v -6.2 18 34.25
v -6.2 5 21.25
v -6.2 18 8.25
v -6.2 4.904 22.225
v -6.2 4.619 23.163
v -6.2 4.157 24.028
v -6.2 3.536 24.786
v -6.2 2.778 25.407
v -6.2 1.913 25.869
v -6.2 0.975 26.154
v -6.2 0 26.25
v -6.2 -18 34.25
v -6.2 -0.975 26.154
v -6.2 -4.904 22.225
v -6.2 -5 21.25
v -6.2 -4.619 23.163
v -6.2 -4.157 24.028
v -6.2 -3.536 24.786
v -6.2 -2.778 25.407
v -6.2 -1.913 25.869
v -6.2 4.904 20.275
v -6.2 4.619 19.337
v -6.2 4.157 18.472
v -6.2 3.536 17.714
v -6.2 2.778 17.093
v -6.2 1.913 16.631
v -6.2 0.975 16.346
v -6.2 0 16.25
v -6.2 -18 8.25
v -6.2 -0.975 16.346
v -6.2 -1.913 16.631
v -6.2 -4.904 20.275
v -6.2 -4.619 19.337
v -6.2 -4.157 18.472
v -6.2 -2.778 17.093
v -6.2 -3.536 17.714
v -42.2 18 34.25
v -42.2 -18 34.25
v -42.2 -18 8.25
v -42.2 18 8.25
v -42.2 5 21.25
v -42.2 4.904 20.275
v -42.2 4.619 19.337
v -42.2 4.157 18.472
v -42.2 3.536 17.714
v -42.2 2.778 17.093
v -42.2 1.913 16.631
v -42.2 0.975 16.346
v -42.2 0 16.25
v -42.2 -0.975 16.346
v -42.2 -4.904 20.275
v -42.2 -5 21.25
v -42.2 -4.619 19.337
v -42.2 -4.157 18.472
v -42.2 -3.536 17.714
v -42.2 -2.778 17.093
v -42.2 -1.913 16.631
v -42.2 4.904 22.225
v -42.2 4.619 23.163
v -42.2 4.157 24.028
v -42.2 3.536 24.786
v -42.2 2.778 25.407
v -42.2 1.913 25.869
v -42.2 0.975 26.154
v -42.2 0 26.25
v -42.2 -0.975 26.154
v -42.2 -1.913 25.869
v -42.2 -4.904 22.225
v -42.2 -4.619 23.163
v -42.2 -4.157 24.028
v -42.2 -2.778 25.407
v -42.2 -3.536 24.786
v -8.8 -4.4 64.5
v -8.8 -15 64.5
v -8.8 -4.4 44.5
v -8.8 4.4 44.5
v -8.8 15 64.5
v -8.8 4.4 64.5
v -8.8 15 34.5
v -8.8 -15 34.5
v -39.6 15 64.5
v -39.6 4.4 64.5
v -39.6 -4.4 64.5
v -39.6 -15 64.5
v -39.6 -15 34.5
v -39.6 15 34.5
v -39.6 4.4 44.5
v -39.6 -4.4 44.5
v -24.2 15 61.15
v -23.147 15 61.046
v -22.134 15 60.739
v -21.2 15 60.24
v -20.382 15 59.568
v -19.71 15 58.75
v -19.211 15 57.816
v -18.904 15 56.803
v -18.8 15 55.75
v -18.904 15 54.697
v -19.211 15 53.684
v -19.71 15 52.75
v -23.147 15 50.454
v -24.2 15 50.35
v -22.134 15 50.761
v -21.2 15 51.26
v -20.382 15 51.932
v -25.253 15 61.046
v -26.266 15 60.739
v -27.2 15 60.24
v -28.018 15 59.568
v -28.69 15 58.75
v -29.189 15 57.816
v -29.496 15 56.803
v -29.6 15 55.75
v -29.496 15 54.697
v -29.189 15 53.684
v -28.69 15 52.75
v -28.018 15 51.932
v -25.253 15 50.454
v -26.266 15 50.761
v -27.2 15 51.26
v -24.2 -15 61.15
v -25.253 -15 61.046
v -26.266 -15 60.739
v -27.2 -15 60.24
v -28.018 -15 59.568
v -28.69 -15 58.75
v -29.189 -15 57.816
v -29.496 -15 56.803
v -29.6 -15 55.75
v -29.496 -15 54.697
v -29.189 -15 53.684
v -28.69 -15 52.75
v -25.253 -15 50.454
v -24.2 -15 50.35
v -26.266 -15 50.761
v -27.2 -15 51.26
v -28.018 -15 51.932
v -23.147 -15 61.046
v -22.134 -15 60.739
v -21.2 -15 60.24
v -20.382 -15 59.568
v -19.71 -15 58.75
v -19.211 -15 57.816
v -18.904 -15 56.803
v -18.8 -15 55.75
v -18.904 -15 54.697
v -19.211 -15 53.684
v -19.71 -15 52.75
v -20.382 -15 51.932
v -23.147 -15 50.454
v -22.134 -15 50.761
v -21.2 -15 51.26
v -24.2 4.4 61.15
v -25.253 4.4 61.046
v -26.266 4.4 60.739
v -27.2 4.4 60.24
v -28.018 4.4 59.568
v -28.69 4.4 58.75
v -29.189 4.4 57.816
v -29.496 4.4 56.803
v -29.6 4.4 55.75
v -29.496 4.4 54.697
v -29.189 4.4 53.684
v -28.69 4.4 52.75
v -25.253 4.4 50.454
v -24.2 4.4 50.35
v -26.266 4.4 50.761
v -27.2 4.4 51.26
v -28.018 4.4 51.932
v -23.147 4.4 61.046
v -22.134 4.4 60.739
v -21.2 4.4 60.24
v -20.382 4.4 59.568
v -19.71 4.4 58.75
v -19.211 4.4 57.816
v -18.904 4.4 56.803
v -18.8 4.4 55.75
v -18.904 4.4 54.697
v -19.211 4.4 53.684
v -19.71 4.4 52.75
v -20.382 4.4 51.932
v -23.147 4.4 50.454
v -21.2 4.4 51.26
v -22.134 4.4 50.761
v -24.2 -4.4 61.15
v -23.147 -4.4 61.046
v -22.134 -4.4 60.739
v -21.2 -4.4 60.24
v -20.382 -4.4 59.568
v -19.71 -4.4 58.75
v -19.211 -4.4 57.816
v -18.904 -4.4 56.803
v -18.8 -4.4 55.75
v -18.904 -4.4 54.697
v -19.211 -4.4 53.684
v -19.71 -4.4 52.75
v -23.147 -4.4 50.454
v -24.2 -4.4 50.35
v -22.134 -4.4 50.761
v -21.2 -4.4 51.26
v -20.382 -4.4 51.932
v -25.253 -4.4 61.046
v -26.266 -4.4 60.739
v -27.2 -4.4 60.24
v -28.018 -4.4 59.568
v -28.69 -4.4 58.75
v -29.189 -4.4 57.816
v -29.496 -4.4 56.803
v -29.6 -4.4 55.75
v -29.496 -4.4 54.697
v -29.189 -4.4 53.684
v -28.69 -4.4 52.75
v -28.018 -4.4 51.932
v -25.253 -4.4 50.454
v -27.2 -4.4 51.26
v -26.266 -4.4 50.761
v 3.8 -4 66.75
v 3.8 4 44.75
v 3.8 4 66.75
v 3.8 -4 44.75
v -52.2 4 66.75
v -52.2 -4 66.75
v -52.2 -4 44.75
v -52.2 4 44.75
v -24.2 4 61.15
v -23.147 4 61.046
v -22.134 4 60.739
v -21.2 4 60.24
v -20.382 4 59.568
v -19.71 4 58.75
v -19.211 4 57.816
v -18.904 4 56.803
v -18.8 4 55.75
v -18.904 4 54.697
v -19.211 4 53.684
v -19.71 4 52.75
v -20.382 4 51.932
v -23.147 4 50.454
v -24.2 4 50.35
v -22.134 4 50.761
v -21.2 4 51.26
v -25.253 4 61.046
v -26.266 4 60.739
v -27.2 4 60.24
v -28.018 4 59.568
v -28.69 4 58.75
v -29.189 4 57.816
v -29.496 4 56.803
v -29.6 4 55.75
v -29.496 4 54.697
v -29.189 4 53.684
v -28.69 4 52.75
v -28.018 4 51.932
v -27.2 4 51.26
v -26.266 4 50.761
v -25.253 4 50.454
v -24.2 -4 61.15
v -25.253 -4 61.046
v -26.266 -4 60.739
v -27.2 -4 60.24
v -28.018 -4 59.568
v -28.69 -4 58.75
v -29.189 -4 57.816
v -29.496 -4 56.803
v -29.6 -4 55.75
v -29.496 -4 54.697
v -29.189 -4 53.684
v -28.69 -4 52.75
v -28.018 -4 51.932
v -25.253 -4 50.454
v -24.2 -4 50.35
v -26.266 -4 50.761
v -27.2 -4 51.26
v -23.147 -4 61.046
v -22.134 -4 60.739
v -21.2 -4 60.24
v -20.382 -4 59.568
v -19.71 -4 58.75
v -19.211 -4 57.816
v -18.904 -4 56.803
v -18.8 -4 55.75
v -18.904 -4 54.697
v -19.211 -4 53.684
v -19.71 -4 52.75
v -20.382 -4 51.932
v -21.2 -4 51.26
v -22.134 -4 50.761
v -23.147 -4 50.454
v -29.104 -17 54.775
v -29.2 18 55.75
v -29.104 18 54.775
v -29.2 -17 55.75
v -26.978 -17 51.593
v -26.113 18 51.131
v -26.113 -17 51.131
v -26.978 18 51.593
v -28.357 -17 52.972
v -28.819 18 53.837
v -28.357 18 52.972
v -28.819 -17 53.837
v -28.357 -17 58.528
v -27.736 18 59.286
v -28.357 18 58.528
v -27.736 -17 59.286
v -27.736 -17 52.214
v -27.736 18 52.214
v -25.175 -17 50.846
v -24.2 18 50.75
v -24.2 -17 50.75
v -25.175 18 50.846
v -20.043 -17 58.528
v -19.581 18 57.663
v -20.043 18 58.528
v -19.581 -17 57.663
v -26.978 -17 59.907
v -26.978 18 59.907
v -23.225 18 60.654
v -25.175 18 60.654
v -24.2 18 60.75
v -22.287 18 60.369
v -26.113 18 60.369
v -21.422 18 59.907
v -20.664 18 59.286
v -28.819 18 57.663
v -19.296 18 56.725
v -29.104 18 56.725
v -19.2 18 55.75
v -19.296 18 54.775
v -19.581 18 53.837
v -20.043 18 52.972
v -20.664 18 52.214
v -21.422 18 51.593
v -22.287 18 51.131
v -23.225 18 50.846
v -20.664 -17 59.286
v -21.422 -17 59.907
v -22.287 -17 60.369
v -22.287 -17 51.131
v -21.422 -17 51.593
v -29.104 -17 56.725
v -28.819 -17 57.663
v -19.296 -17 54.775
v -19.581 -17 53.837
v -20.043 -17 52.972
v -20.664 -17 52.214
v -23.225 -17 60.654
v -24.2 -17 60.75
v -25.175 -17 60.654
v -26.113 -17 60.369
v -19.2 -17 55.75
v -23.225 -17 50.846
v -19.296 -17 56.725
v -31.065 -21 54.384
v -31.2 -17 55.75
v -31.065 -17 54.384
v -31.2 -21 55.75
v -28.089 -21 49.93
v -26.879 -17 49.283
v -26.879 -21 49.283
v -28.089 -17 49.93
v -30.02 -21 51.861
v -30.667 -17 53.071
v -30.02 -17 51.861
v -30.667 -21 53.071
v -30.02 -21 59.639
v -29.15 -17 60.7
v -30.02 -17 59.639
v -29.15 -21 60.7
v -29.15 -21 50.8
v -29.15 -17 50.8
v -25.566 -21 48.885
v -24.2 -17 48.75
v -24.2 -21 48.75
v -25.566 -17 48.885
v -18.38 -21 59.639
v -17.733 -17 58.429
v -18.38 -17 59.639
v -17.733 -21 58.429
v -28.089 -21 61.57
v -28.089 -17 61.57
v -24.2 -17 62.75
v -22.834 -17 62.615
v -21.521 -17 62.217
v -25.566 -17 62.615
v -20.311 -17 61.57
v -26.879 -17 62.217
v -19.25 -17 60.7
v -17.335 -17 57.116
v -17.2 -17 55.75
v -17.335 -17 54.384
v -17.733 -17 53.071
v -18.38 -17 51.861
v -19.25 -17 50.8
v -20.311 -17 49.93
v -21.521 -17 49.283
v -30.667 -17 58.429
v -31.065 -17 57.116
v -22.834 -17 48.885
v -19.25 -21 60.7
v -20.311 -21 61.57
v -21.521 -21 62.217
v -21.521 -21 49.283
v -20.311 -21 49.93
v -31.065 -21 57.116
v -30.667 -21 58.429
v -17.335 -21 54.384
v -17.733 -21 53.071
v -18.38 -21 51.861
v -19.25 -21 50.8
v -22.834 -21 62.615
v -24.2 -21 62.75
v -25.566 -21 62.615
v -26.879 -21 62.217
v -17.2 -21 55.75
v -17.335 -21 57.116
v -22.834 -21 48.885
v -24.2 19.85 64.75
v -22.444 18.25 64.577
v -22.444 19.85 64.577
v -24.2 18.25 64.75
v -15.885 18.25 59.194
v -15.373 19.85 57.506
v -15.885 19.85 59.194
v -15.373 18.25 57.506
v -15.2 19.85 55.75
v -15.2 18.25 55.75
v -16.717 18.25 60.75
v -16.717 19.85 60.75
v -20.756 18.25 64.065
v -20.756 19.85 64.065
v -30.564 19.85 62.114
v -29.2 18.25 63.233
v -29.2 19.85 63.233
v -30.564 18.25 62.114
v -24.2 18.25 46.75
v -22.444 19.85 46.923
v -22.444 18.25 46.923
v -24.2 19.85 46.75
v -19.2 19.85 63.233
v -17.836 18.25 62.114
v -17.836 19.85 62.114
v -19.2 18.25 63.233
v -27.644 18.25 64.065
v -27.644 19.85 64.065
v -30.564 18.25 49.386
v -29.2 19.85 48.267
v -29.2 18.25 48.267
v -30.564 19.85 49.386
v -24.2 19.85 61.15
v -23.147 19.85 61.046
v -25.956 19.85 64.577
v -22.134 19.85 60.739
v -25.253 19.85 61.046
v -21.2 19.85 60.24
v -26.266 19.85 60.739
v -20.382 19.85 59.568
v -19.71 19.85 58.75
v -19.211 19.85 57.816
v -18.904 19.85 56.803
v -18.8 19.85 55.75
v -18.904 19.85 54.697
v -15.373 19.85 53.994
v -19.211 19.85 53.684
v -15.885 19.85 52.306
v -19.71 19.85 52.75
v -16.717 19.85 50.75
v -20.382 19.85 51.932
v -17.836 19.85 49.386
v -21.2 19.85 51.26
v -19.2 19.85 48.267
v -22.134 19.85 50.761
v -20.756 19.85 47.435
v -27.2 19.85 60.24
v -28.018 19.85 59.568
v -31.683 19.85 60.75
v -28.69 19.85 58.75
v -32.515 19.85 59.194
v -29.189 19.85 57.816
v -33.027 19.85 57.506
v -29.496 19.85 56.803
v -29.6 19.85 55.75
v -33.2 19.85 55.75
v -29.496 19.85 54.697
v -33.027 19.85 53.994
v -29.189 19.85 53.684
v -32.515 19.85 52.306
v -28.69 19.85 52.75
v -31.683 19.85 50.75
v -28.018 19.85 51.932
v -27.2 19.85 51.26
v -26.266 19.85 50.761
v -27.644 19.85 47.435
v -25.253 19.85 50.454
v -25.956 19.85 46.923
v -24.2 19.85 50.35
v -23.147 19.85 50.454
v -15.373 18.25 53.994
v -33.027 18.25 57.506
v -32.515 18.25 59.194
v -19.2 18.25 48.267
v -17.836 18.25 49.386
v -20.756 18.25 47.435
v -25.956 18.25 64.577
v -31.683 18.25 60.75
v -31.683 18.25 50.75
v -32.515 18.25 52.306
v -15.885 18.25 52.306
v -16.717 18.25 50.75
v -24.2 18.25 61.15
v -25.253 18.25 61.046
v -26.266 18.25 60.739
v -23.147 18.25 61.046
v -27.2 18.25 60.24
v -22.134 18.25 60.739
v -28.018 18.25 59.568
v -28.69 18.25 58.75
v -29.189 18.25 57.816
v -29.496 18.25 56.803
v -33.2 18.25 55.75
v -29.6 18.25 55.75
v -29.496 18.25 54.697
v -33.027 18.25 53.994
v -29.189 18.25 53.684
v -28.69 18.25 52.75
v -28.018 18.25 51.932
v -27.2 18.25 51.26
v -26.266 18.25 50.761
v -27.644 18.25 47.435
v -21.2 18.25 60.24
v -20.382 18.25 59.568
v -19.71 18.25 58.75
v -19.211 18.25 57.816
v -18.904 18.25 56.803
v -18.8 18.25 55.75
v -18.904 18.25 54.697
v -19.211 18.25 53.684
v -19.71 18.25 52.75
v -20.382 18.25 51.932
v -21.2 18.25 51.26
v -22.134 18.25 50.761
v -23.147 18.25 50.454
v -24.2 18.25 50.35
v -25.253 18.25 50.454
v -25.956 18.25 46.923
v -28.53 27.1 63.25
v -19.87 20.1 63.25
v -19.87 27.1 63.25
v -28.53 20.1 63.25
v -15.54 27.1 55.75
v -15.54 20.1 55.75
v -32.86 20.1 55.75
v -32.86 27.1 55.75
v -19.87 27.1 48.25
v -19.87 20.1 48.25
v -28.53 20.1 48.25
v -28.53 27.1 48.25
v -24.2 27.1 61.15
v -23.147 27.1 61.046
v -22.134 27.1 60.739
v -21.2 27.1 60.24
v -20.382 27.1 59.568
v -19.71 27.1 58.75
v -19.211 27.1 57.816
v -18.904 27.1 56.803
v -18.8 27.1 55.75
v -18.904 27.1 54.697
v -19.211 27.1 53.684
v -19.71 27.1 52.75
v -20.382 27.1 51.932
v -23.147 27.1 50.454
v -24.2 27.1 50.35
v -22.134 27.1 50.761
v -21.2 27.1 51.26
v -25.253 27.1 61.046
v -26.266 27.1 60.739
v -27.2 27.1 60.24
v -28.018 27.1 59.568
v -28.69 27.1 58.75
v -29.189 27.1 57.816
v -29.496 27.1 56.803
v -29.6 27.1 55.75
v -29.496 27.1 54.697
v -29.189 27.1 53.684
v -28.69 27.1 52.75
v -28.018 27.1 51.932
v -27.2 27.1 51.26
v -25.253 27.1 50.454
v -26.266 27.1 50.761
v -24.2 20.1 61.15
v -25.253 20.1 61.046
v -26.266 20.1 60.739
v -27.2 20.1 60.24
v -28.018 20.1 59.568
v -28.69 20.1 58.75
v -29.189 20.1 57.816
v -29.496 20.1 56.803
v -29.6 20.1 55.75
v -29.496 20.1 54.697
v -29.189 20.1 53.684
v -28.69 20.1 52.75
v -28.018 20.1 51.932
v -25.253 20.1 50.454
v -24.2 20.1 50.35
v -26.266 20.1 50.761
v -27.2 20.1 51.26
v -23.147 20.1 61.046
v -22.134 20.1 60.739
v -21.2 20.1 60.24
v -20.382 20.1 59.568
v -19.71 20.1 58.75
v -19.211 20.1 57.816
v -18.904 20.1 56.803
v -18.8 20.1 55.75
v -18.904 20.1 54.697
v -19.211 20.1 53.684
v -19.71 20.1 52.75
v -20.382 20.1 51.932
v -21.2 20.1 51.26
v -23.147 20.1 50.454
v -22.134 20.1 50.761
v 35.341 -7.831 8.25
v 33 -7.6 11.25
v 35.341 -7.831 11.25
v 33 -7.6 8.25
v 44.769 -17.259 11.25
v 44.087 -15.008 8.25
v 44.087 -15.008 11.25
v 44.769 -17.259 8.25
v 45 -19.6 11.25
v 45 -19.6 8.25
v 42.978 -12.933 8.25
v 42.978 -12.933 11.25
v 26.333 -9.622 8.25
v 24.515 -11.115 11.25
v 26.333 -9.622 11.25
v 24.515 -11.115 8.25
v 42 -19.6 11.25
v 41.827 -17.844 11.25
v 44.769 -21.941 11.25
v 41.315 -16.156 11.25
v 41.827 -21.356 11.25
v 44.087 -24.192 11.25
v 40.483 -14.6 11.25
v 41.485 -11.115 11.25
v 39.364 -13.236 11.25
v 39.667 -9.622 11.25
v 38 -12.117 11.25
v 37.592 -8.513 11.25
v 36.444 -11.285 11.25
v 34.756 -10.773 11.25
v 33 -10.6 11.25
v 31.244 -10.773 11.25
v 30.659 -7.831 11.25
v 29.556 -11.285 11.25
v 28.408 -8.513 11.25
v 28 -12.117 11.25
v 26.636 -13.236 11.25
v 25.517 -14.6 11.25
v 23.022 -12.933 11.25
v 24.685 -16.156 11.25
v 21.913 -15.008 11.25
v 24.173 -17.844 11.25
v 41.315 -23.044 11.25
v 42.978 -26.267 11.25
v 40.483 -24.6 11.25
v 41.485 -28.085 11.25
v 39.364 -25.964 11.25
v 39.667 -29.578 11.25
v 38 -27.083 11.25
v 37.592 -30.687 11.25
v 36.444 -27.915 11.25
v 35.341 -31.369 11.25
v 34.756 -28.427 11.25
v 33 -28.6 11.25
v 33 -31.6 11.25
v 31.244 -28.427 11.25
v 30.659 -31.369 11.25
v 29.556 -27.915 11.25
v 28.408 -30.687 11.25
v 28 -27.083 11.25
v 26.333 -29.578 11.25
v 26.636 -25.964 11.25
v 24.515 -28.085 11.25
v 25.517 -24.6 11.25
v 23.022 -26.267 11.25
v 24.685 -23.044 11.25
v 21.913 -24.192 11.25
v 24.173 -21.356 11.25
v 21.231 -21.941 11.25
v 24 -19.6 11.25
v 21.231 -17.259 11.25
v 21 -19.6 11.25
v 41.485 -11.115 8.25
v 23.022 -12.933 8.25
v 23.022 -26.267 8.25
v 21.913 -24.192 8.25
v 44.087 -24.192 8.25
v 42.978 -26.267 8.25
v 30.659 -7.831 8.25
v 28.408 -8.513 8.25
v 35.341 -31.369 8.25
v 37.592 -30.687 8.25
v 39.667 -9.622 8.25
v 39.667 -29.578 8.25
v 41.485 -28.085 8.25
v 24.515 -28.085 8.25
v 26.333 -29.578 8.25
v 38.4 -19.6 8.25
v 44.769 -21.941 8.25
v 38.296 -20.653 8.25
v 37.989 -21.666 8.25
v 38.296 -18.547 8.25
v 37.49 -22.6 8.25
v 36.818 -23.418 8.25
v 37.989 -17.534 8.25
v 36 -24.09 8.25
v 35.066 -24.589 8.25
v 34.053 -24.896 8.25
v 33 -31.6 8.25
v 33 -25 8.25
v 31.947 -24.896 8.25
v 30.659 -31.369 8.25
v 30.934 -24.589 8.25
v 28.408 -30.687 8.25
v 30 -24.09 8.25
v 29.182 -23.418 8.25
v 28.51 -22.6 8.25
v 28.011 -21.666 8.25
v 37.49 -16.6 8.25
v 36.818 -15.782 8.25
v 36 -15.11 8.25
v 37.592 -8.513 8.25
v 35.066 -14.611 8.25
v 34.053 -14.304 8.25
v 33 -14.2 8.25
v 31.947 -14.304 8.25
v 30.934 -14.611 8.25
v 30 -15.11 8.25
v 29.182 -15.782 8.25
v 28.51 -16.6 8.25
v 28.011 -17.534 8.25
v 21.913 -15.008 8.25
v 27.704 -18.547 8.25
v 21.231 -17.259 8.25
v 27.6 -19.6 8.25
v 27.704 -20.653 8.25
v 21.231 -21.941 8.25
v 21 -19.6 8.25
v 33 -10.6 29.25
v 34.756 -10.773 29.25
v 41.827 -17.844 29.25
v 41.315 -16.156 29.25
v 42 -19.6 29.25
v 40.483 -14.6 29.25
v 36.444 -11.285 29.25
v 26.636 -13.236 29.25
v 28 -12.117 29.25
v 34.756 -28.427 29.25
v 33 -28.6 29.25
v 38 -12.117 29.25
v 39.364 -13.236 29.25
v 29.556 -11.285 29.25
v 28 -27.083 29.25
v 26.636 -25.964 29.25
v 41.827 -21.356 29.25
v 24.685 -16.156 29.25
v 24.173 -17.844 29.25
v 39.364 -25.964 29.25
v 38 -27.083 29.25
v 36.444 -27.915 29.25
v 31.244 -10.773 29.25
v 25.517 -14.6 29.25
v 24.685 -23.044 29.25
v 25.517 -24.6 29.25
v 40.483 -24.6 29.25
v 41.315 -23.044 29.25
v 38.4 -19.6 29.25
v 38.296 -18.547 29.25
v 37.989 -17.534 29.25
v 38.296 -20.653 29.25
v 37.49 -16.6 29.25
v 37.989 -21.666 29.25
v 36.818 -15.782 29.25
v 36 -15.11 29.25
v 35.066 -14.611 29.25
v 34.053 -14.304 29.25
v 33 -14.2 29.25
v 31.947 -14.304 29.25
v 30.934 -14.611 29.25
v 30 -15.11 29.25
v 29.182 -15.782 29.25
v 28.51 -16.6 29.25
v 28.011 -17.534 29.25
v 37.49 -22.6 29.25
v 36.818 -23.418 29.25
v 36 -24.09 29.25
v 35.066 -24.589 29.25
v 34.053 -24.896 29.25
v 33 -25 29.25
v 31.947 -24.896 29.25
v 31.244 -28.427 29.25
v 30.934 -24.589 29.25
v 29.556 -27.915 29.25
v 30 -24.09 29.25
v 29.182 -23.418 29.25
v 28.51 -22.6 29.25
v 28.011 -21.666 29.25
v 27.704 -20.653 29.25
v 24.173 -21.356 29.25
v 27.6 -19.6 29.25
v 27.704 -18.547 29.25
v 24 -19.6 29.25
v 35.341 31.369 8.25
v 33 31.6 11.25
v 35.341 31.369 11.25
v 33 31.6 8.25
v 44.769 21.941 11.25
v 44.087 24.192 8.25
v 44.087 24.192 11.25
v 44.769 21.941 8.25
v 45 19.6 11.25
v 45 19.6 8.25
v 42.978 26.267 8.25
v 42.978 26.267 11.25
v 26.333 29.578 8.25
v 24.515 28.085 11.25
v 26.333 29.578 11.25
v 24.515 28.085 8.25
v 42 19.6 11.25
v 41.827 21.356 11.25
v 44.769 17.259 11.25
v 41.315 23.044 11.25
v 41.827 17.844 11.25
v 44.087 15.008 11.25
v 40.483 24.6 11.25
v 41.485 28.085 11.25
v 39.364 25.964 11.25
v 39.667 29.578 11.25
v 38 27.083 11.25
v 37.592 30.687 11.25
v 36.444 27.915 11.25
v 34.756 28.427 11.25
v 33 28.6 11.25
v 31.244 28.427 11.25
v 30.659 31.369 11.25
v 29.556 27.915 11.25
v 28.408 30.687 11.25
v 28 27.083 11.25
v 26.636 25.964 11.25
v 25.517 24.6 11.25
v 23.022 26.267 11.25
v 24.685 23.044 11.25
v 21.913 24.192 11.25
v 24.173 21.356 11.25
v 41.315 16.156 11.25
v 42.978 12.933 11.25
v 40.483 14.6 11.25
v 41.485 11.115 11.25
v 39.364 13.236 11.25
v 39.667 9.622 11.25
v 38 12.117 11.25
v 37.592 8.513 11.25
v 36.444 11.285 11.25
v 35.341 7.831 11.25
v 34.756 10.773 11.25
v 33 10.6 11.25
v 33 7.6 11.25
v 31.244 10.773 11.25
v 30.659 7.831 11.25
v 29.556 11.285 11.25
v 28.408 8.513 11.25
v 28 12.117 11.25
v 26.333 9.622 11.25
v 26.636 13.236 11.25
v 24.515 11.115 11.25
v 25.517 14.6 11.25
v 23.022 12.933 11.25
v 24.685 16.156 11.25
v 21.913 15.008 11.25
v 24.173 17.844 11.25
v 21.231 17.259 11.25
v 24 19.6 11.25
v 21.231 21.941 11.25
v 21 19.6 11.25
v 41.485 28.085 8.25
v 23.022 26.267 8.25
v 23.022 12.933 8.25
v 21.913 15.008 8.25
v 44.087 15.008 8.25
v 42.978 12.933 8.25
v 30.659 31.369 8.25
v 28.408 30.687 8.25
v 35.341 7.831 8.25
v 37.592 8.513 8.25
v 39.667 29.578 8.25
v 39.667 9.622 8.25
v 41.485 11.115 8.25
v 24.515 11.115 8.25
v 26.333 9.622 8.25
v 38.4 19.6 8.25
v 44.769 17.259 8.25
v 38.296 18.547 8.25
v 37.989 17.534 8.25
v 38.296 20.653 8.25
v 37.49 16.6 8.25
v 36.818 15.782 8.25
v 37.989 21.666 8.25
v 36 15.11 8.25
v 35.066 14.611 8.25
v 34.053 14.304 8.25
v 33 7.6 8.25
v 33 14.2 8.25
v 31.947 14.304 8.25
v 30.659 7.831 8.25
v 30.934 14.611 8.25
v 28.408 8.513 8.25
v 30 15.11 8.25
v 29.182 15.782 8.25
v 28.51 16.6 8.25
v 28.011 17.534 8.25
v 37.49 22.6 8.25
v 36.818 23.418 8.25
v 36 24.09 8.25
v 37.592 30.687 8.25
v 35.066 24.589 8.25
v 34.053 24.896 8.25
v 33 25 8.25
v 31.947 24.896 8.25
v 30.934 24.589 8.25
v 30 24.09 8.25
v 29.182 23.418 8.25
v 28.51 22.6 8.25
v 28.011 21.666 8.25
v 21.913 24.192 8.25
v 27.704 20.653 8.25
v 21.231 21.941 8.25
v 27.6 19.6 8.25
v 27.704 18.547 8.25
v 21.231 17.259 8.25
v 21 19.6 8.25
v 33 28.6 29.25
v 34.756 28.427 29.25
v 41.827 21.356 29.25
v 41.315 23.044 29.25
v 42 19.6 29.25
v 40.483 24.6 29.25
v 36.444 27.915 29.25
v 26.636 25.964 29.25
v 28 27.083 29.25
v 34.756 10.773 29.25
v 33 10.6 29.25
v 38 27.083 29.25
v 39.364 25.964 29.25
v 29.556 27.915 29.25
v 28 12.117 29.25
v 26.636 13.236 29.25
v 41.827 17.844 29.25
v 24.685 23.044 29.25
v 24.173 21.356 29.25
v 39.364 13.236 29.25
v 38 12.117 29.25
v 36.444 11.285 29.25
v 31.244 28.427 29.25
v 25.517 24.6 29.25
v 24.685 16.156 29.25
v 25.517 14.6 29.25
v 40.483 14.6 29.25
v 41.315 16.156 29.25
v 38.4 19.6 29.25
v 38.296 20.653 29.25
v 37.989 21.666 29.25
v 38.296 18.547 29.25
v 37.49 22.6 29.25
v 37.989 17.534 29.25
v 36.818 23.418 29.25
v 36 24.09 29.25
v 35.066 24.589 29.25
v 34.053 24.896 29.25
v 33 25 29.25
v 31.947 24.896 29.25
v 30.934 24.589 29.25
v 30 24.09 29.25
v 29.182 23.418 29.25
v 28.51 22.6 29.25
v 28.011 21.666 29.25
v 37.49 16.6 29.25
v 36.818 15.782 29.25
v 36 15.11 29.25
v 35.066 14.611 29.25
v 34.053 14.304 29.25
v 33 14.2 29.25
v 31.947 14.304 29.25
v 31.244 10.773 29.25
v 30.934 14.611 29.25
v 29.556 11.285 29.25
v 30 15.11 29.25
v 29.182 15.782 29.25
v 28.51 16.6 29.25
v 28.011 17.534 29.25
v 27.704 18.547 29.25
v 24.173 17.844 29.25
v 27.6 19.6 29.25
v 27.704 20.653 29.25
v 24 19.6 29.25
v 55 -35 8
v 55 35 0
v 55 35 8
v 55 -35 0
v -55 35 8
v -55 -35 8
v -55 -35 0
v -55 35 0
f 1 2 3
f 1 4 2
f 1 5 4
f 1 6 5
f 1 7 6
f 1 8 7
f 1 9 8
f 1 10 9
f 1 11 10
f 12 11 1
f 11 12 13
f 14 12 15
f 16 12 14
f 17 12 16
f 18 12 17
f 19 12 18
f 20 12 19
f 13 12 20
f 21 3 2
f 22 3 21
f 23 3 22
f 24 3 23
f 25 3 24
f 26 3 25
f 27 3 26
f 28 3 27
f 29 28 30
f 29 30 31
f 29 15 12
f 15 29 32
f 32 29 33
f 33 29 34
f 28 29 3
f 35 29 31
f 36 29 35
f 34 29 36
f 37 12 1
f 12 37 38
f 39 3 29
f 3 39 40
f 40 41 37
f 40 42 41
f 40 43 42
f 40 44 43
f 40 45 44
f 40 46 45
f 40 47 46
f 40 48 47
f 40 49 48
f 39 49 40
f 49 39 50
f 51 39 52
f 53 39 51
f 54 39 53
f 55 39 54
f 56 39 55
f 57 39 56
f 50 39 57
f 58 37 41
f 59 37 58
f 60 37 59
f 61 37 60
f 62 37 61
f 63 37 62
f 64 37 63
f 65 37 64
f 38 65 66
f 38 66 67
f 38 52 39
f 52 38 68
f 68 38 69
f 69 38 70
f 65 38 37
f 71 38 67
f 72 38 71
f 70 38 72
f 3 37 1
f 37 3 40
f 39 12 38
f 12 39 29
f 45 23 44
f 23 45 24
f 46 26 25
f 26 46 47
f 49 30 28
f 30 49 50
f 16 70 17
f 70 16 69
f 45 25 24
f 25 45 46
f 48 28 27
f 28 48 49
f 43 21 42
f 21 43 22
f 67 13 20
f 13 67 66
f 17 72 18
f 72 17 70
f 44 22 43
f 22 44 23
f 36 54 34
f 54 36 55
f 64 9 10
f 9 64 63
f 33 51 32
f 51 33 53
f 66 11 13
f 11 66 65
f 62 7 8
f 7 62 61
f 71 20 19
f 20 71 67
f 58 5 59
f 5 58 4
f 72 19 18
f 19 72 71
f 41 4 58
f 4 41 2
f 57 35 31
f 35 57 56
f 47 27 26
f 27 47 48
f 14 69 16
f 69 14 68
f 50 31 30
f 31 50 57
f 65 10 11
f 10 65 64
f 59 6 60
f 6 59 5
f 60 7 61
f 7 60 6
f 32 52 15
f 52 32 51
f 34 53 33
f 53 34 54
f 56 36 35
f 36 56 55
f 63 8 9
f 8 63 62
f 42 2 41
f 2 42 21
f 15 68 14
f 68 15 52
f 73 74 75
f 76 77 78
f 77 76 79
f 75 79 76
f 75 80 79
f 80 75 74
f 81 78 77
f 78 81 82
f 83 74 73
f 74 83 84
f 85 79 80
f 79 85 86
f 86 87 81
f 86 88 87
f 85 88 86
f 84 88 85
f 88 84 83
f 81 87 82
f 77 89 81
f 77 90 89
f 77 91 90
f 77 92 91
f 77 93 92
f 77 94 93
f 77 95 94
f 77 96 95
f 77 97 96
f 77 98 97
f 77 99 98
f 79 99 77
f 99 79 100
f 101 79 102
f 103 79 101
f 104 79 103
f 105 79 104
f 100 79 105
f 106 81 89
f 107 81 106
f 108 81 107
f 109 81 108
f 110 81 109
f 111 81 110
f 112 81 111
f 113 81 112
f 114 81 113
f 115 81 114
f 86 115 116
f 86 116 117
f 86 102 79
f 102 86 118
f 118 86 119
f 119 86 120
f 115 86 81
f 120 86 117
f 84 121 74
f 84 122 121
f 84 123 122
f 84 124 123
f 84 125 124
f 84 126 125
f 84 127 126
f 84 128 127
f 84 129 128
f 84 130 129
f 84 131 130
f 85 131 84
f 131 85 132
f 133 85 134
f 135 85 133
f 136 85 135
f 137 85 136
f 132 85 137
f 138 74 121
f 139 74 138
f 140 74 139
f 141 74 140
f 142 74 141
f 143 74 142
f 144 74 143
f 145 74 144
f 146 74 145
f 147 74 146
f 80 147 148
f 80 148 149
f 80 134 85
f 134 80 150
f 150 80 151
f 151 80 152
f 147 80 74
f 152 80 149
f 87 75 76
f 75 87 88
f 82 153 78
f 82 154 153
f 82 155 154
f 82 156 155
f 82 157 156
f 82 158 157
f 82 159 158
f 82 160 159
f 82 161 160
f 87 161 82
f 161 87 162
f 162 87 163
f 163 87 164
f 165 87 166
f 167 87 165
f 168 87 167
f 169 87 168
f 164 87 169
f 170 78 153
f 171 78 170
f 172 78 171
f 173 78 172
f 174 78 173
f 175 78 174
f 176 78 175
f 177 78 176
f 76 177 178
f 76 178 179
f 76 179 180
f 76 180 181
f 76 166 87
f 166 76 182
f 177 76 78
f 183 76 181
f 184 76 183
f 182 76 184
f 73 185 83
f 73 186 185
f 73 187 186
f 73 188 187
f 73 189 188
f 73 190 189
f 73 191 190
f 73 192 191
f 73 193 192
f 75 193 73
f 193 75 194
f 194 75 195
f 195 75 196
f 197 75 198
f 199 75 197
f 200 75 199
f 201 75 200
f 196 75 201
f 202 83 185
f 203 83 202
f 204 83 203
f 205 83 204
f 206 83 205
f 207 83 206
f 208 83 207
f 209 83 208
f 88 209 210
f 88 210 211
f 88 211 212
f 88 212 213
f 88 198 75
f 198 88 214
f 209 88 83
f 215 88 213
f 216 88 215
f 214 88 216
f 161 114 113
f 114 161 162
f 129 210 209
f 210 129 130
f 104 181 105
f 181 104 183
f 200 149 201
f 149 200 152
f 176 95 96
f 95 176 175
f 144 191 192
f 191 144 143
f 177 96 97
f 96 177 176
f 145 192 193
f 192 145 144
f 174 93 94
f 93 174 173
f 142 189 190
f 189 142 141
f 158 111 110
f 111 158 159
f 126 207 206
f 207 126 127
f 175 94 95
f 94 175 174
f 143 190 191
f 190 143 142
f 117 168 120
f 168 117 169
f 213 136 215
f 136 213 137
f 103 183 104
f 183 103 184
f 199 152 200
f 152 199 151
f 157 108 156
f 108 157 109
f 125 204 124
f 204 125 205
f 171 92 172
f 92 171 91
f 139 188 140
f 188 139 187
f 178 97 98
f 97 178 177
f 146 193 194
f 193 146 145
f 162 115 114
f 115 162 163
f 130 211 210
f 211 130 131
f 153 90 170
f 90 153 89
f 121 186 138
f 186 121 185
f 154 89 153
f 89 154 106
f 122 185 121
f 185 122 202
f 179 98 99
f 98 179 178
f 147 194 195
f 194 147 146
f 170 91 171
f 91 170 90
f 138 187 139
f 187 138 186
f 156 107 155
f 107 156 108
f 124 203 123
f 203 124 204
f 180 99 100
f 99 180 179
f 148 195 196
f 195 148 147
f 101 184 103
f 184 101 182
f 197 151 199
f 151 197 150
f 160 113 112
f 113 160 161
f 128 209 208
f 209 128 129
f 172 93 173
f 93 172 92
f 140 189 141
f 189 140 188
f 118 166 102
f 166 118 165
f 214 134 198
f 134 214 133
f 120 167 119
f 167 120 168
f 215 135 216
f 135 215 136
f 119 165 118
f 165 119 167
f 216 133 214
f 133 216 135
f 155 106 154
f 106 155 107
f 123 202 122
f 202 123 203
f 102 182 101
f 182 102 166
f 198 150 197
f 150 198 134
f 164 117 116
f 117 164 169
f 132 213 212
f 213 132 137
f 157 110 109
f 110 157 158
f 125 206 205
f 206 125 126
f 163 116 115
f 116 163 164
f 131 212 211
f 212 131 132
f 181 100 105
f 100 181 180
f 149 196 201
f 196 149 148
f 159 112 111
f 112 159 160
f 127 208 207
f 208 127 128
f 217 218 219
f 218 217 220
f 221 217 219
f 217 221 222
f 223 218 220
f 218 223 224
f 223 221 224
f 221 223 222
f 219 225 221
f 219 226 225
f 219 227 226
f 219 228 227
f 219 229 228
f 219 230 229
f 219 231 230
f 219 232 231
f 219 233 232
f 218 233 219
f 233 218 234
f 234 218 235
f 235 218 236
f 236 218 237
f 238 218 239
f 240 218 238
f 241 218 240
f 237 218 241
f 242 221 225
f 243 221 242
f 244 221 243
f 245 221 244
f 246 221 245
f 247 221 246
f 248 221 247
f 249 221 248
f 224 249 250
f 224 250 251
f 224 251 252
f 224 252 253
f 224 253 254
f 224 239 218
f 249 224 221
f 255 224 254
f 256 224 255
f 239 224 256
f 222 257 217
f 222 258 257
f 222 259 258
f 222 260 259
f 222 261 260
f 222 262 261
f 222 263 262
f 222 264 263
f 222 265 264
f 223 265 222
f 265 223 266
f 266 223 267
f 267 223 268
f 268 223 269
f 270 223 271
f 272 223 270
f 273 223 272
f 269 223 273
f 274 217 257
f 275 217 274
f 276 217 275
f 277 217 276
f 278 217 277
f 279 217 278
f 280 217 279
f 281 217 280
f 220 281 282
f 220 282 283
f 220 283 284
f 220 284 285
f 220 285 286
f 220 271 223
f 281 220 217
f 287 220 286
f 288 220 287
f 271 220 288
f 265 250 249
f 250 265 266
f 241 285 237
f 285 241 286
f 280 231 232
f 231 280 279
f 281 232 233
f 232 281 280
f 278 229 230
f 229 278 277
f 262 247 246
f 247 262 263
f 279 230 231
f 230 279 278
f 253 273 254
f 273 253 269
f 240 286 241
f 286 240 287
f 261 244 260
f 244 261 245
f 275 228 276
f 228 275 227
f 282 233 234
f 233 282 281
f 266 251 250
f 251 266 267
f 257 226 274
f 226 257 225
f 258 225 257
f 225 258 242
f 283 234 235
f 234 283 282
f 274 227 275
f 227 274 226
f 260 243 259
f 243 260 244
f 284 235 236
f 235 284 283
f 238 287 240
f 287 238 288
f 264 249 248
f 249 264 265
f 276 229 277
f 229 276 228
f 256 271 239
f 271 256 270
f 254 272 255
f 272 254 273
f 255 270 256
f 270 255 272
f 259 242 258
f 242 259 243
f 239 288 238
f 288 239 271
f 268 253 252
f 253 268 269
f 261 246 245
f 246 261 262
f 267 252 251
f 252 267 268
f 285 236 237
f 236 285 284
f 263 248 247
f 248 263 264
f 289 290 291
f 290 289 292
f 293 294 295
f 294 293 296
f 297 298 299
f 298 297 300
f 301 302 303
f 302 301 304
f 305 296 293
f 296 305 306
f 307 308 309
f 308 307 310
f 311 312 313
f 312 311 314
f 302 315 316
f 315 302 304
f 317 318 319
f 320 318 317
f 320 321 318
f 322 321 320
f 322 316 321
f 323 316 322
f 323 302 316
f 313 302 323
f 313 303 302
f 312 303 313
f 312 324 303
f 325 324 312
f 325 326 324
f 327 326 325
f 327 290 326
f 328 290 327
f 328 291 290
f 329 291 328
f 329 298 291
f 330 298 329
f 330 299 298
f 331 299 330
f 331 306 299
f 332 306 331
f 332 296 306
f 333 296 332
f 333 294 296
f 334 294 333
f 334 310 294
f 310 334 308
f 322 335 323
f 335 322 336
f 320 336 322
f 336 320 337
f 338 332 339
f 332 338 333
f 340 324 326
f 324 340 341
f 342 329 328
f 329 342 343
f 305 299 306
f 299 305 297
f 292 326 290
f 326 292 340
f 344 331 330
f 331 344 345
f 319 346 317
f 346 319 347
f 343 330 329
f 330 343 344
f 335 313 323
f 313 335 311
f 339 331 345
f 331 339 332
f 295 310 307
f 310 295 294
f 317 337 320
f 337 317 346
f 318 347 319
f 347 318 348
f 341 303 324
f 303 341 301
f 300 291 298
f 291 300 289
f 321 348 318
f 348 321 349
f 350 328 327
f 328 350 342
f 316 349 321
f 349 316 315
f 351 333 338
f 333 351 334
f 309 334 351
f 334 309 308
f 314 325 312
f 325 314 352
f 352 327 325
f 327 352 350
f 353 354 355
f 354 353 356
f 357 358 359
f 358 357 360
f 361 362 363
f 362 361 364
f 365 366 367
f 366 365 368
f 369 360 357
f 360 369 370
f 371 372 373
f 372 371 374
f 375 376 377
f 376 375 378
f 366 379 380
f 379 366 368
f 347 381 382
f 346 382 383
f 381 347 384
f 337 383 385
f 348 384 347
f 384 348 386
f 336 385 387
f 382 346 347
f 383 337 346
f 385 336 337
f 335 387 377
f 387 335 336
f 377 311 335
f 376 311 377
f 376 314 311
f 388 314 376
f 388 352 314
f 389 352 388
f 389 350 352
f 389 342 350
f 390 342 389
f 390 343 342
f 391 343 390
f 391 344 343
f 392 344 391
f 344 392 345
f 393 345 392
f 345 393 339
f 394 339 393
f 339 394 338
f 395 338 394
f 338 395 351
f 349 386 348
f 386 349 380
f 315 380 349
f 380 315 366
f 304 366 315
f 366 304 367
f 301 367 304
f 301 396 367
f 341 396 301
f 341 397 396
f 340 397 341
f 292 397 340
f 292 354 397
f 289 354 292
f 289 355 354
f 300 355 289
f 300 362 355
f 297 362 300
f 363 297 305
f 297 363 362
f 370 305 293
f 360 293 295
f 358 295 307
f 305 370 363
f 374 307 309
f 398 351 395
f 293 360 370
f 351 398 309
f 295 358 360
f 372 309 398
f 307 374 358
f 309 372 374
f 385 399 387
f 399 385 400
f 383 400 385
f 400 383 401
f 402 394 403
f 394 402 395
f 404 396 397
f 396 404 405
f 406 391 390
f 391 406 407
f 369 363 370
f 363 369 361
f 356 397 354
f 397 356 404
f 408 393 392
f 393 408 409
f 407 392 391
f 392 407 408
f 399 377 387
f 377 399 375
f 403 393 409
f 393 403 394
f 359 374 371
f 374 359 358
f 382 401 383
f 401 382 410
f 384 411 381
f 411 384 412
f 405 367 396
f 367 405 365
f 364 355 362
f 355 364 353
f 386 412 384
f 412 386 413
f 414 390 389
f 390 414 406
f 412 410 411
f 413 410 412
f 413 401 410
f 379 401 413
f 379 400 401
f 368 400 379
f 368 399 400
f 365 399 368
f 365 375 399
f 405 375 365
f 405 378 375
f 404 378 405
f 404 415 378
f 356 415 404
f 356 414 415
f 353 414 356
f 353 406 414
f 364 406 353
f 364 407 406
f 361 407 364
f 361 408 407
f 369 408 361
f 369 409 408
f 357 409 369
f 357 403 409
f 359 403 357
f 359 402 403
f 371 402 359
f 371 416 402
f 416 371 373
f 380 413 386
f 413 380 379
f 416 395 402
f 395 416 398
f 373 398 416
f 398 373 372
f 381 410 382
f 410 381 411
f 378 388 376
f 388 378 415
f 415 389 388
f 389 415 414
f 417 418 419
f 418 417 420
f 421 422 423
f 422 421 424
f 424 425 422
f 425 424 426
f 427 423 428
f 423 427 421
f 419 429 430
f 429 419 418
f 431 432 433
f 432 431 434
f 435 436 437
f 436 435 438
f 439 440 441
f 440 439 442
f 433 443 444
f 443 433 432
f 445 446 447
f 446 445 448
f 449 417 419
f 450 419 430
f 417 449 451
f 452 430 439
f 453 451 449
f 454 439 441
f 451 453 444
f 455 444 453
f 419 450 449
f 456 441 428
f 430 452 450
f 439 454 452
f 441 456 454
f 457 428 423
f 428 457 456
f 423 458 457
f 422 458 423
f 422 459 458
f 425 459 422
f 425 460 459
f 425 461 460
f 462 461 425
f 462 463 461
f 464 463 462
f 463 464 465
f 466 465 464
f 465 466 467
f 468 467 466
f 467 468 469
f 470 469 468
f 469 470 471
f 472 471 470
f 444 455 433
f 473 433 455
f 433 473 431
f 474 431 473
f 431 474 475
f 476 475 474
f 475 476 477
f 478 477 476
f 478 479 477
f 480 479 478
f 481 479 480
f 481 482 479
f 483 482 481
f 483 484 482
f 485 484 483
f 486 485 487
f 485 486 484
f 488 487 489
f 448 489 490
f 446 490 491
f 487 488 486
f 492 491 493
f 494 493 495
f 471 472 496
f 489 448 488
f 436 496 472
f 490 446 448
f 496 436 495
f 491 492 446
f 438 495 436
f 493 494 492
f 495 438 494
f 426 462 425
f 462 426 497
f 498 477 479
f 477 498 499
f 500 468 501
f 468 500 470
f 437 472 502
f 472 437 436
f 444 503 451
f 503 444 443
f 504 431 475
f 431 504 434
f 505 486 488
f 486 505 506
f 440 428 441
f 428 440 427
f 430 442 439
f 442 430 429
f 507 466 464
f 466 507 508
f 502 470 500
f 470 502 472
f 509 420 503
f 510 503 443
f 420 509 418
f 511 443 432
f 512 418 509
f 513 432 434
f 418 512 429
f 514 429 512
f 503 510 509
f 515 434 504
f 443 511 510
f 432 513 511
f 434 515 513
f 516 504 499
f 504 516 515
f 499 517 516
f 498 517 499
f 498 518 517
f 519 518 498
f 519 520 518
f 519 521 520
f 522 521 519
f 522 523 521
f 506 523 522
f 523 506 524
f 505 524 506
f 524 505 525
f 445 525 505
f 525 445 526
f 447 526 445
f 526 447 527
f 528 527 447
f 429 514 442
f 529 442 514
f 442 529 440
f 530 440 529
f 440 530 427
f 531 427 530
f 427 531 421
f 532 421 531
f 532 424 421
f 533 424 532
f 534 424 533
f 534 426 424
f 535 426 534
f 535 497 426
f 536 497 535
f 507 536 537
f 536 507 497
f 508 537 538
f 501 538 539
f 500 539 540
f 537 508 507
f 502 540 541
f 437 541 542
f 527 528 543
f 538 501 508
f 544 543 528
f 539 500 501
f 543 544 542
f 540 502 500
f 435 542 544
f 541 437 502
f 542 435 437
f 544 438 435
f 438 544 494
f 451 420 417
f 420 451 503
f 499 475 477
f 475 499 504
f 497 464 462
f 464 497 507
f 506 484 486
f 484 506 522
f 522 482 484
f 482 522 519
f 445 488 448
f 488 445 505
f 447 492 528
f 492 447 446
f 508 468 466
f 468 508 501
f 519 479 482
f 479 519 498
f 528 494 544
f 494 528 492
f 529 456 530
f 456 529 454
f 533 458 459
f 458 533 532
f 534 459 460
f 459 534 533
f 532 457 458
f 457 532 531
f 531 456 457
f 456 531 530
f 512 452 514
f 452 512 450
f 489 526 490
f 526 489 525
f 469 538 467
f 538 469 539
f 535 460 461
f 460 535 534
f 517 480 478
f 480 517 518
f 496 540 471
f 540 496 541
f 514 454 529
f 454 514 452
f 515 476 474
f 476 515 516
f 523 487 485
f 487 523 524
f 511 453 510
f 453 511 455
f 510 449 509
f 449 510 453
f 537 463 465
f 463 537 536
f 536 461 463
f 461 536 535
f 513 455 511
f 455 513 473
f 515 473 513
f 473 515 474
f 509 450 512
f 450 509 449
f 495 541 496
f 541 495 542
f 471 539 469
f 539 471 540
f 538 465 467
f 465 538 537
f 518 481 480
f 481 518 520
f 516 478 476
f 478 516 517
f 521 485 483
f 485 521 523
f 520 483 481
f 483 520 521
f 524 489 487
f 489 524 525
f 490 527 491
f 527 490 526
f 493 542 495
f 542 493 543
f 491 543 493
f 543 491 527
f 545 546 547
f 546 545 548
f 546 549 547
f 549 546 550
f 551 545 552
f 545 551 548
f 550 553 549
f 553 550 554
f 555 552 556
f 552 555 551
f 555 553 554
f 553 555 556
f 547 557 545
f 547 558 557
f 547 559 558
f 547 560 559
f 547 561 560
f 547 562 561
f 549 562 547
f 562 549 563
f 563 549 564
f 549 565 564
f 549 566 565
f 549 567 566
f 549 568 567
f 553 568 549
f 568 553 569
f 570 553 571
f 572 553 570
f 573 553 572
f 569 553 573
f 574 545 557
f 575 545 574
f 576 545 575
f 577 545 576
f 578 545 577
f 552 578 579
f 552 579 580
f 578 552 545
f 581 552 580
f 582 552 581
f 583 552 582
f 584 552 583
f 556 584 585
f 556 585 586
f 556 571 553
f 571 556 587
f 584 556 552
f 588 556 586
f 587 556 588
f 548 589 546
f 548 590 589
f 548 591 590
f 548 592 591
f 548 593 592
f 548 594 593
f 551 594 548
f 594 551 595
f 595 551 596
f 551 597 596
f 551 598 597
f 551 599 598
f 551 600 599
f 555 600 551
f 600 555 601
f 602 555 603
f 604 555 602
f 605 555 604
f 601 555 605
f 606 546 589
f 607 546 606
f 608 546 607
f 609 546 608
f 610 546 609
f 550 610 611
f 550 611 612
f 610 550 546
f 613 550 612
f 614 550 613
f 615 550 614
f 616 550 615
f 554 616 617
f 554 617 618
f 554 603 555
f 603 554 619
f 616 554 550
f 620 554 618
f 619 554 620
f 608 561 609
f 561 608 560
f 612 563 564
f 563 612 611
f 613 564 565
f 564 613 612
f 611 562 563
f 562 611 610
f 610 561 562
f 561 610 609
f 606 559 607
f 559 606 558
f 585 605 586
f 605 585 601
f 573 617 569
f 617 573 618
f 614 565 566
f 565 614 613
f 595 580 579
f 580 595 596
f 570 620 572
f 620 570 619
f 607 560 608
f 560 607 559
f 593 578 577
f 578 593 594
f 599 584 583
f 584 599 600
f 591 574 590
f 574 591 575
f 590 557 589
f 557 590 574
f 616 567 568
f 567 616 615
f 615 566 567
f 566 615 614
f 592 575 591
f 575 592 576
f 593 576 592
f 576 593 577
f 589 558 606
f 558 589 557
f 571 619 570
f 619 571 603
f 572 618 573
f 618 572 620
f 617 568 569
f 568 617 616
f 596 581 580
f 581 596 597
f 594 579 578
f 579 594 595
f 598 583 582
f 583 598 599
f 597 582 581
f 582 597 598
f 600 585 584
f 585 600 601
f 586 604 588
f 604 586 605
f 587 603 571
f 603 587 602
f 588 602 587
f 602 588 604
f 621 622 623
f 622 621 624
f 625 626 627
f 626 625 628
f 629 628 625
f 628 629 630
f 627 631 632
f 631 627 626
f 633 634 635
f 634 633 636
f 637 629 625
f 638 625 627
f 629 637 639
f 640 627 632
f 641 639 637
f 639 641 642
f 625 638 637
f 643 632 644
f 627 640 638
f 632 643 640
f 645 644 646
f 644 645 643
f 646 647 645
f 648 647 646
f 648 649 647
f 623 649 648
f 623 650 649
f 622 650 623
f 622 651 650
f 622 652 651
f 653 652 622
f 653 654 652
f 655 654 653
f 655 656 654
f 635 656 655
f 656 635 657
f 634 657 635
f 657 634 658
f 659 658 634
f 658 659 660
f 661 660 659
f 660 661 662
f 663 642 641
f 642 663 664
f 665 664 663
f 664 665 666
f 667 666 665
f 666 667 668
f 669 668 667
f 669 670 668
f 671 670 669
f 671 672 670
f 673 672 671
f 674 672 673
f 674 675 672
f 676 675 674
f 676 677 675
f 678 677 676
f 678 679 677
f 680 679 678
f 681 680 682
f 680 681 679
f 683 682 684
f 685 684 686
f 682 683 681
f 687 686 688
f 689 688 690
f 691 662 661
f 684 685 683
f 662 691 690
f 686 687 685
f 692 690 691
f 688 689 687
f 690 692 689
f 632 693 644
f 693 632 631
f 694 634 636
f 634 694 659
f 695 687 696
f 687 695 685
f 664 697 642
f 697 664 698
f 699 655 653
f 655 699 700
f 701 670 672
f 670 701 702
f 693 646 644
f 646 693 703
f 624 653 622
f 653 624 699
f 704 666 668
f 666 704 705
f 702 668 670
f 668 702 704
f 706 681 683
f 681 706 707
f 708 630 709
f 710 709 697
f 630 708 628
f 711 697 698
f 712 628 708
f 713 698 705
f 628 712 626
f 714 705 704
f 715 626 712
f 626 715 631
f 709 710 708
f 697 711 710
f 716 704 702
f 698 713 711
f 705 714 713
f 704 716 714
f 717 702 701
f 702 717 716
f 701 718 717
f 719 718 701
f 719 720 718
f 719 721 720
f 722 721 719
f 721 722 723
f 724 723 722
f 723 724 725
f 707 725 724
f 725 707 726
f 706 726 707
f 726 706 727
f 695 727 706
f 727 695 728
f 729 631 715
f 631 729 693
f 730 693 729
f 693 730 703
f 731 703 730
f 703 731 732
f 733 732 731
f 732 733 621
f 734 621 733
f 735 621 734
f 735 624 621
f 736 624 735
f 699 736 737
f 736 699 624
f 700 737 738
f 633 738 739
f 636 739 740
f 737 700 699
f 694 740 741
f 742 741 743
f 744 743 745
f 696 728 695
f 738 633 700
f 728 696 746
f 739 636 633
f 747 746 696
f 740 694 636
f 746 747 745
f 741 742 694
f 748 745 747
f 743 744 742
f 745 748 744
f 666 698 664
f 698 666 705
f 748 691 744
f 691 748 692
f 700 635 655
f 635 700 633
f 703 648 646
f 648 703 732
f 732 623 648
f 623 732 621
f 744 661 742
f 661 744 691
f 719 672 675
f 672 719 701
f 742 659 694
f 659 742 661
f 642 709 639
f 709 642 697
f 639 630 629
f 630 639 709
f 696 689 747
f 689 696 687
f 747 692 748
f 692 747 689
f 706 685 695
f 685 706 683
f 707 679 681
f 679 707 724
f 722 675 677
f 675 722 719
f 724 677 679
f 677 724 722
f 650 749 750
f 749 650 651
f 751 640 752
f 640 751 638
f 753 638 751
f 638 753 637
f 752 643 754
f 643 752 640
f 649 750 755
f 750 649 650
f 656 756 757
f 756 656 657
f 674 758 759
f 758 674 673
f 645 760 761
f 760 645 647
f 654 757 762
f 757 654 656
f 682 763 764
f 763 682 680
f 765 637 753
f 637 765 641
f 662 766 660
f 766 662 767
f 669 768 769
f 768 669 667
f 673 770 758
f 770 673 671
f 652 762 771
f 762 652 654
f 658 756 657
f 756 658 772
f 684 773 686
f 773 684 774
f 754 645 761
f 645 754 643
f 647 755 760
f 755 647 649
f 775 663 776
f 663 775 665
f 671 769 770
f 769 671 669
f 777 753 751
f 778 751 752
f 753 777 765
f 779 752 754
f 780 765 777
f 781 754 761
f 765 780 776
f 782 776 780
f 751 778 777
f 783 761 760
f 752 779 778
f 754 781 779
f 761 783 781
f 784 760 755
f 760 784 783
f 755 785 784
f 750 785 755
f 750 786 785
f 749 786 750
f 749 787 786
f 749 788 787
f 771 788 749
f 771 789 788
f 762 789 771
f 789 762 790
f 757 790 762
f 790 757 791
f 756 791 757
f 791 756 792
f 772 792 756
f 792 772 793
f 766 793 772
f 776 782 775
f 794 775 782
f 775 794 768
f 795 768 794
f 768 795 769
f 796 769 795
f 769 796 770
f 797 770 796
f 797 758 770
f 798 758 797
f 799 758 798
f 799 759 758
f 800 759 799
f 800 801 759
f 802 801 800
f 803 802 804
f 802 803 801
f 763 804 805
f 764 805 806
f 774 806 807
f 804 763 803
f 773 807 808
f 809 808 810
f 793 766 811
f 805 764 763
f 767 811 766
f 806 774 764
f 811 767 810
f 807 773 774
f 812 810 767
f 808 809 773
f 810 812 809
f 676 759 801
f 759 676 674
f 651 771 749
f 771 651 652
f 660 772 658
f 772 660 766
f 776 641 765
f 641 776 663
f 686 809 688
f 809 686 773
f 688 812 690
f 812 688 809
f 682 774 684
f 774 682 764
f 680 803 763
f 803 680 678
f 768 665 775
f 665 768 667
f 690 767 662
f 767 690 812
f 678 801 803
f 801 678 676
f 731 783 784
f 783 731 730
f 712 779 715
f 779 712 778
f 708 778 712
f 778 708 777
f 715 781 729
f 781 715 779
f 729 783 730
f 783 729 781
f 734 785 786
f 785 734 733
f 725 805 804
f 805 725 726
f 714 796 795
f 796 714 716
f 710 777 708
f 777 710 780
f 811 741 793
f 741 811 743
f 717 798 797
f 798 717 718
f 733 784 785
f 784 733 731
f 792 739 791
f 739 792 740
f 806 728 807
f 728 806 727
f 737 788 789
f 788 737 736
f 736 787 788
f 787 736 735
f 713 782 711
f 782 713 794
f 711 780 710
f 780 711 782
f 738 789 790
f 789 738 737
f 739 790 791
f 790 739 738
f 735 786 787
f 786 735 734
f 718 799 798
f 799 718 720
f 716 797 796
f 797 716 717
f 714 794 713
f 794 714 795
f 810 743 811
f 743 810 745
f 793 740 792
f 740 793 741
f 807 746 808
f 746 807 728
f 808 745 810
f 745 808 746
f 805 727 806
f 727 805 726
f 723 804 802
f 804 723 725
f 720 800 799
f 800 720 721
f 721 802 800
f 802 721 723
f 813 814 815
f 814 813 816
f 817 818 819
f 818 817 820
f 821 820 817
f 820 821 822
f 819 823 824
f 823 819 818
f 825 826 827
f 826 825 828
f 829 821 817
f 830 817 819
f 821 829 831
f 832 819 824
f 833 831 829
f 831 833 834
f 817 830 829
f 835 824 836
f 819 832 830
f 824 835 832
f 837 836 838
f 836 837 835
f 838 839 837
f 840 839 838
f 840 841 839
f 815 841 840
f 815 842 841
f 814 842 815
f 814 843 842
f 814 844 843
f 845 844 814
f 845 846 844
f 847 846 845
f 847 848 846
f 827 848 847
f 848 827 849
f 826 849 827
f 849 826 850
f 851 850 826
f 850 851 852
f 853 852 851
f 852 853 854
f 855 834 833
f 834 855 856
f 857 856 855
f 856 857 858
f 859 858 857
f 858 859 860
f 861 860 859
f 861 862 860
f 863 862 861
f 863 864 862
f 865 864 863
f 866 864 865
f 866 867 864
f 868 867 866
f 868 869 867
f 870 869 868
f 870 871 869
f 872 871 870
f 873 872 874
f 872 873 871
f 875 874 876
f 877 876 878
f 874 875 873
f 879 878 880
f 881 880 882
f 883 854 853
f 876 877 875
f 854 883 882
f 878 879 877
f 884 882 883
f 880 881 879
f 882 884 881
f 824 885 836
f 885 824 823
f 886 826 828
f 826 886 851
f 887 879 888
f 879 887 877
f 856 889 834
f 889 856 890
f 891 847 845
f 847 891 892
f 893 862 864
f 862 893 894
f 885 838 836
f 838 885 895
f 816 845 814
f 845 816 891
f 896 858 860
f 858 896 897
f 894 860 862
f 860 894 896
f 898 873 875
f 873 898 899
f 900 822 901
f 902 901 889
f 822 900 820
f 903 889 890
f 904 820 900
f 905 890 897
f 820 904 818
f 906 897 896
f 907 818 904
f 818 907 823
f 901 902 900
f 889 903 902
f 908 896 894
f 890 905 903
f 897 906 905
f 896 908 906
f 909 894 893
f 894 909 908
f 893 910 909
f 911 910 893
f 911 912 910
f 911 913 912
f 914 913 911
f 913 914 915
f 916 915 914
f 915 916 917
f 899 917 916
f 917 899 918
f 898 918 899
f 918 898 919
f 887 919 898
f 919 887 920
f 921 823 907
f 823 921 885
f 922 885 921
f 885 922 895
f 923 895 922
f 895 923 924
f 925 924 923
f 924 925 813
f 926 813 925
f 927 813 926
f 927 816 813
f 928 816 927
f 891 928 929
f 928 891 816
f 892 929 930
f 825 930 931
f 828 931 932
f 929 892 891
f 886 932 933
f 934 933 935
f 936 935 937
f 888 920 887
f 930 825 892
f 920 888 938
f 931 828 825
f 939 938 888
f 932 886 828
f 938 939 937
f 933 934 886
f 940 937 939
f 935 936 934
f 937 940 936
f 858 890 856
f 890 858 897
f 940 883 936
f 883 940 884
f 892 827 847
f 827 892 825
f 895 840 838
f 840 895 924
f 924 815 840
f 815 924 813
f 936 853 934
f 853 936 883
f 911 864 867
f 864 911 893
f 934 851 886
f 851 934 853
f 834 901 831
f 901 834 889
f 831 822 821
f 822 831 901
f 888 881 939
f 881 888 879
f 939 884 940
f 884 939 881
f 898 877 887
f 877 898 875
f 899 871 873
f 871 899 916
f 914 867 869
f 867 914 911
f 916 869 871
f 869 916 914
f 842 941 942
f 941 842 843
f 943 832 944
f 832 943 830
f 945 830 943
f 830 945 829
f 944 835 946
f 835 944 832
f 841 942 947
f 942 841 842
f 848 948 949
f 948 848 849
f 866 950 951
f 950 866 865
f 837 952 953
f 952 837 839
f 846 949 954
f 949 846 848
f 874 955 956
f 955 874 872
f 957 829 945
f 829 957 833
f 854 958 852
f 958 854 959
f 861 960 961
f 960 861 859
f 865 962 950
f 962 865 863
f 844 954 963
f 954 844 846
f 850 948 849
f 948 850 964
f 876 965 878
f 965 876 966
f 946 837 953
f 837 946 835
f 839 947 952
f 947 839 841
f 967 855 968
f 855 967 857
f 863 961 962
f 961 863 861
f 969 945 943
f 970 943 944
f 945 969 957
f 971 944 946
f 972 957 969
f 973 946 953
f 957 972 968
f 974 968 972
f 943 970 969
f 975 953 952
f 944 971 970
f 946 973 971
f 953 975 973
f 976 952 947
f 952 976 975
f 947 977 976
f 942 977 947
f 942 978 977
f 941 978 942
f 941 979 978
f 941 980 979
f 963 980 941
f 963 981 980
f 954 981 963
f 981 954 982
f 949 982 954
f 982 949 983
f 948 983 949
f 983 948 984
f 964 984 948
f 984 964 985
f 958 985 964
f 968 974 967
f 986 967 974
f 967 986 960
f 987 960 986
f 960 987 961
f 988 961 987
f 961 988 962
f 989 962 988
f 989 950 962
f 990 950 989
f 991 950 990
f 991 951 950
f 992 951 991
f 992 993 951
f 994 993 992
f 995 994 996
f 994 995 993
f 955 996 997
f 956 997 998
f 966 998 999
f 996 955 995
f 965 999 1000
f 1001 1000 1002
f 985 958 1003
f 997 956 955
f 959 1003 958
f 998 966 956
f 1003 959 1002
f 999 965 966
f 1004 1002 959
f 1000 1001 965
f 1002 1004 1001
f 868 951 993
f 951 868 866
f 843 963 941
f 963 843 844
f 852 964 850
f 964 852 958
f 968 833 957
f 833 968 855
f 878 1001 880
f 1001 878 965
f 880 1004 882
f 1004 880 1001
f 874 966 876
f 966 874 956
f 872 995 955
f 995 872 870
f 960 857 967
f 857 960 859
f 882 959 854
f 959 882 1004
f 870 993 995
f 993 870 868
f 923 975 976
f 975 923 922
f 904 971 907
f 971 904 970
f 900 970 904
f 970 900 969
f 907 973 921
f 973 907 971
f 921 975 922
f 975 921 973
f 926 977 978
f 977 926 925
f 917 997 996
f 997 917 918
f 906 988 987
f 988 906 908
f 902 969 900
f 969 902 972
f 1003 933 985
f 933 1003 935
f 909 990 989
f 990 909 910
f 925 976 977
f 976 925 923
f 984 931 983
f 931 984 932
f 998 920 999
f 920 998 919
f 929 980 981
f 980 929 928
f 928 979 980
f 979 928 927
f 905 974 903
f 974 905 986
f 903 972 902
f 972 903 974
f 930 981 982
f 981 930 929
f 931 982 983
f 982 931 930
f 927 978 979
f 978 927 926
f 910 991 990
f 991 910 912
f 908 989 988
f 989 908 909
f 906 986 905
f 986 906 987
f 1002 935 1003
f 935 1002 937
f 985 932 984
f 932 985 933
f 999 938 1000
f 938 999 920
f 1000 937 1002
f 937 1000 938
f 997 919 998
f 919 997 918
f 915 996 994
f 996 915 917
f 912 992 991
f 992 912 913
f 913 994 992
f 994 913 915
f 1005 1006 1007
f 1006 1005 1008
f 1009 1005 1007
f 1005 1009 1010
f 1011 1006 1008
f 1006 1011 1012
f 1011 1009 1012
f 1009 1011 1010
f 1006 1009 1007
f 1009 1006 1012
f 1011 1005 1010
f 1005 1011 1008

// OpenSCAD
$fn = 32;

// ------------------------------------------------------------------------
// Indexing jig: plate 110 x 70 mm, pin d10
// Every part is its own module, assembly() places every instance.
// ------------------------------------------------------------------------

// --- part 1 ---
module jig_plate() {
  difference() {
    translate([-55, -35, 0]) cube([110, 70, 8]);
  }
}

// --- part 2 ---
module locator_block() {
  difference() {
    translate([-18, -18, 0]) cube([36, 36, 26]);
    translate([0, 0, 13]) rotate([0, 90, 0]) cylinder(h = 38, d = 10, center = true);
  }
}

// --- part 3 ---
module index_fork() {
  difference() {
    translate([-15.4, -15, 0]) cube([30.8, 30, 30]);
    translate([-16.4, -4.4, 10]) cube([32.8, 8.8, 21]);
    translate([0, 0, 21.25]) rotate([90, 0, 0]) cylinder(h = 32, d = 10.8, center = true);
  }
}

// --- part 4 ---
module index_arm() {
  difference() {
    translate([-28, -4, 0]) cube([56, 8, 22]);
    translate([0, 0, 11]) rotate([90, 0, 0]) cylinder(h = 10, d = 10.8, center = true);
  }
}

// --- part 5 ---
module index_pin() {
  rotate([0, 90, 0]) cylinder(h = 36, d = 10, center = true);
  translate([-21, 0, 0]) rotate([0, 90, 0]) cylinder(h = 4, d = 14);
}

// --- part 6 ---
module pin_washer() {
  difference() {
      translate([0, 0, 0]) cylinder(h = 1.6, d = 18);
      translate([0, 0, -1]) cylinder(h = 3.6, d = 10.8);
    }
}

// --- part 7 ---
module lock_nut() {
  difference() {
    linear_extrude(height = 7) polygon(points = [[8.66, 0], [4.33, 7.5], [-4.33, 7.5], [-8.66, 0], [-4.33, -7.5], [4.33, -7.5]]);
    translate([0, 0, -1]) cylinder(h = 9, d = 10.8);
  }
}

// --- part 8 ---
module guide_bush_a() {
  difference() {
    union() {
      cylinder(h = 3, d = 24);
      translate([0, 0, 3]) cylinder(h = 18, d = 18);
    }
    translate([0, 0, -1]) cylinder(h = 23, d = 10.8);
  }
}

// --- part 9 ---
module guide_bush_b() {
  difference() {
    union() {
      cylinder(h = 3, d = 24);
      translate([0, 0, 3]) cylinder(h = 18, d = 18);
    }
    translate([0, 0, -1]) cylinder(h = 23, d = 10.8);
  }
}

// --- assembly ---
module assembly() {
  color([0.80, 0.24, 0.20]) translate([0, 0, 0]) rotate([0, 0, 0]) jig_plate();
  color([0.20, 0.45, 0.75]) translate([-24.2, 0, 8.25]) rotate([0, 0, 0]) locator_block();
  color([0.25, 0.62, 0.32]) translate([-24.2, 0, 34.5]) rotate([0, 0, 0]) index_fork();
  color([0.92, 0.70, 0.18]) translate([-24.2, 0, 44.75]) rotate([0, 0, 0]) index_arm();
  color([0.58, 0.35, 0.70]) translate([-24.2, 0, 55.75]) rotate([0, 0, 90]) index_pin();
  color([0.16, 0.66, 0.66]) translate([-24.2, 19.85, 55.75]) rotate([90, 0, 0]) pin_washer();
  color([0.85, 0.48, 0.18]) translate([-24.2, 27.1, 55.75]) rotate([90, 0, 0]) lock_nut();
  color([0.55, 0.60, 0.65]) translate([33, -19.6, 8.25]) rotate([0, 0, 0]) guide_bush_a();
  color([0.75, 0.30, 0.55]) translate([33, 19.6, 8.25]) rotate([0, 0, 0]) guide_bush_b();
}

assembly();
